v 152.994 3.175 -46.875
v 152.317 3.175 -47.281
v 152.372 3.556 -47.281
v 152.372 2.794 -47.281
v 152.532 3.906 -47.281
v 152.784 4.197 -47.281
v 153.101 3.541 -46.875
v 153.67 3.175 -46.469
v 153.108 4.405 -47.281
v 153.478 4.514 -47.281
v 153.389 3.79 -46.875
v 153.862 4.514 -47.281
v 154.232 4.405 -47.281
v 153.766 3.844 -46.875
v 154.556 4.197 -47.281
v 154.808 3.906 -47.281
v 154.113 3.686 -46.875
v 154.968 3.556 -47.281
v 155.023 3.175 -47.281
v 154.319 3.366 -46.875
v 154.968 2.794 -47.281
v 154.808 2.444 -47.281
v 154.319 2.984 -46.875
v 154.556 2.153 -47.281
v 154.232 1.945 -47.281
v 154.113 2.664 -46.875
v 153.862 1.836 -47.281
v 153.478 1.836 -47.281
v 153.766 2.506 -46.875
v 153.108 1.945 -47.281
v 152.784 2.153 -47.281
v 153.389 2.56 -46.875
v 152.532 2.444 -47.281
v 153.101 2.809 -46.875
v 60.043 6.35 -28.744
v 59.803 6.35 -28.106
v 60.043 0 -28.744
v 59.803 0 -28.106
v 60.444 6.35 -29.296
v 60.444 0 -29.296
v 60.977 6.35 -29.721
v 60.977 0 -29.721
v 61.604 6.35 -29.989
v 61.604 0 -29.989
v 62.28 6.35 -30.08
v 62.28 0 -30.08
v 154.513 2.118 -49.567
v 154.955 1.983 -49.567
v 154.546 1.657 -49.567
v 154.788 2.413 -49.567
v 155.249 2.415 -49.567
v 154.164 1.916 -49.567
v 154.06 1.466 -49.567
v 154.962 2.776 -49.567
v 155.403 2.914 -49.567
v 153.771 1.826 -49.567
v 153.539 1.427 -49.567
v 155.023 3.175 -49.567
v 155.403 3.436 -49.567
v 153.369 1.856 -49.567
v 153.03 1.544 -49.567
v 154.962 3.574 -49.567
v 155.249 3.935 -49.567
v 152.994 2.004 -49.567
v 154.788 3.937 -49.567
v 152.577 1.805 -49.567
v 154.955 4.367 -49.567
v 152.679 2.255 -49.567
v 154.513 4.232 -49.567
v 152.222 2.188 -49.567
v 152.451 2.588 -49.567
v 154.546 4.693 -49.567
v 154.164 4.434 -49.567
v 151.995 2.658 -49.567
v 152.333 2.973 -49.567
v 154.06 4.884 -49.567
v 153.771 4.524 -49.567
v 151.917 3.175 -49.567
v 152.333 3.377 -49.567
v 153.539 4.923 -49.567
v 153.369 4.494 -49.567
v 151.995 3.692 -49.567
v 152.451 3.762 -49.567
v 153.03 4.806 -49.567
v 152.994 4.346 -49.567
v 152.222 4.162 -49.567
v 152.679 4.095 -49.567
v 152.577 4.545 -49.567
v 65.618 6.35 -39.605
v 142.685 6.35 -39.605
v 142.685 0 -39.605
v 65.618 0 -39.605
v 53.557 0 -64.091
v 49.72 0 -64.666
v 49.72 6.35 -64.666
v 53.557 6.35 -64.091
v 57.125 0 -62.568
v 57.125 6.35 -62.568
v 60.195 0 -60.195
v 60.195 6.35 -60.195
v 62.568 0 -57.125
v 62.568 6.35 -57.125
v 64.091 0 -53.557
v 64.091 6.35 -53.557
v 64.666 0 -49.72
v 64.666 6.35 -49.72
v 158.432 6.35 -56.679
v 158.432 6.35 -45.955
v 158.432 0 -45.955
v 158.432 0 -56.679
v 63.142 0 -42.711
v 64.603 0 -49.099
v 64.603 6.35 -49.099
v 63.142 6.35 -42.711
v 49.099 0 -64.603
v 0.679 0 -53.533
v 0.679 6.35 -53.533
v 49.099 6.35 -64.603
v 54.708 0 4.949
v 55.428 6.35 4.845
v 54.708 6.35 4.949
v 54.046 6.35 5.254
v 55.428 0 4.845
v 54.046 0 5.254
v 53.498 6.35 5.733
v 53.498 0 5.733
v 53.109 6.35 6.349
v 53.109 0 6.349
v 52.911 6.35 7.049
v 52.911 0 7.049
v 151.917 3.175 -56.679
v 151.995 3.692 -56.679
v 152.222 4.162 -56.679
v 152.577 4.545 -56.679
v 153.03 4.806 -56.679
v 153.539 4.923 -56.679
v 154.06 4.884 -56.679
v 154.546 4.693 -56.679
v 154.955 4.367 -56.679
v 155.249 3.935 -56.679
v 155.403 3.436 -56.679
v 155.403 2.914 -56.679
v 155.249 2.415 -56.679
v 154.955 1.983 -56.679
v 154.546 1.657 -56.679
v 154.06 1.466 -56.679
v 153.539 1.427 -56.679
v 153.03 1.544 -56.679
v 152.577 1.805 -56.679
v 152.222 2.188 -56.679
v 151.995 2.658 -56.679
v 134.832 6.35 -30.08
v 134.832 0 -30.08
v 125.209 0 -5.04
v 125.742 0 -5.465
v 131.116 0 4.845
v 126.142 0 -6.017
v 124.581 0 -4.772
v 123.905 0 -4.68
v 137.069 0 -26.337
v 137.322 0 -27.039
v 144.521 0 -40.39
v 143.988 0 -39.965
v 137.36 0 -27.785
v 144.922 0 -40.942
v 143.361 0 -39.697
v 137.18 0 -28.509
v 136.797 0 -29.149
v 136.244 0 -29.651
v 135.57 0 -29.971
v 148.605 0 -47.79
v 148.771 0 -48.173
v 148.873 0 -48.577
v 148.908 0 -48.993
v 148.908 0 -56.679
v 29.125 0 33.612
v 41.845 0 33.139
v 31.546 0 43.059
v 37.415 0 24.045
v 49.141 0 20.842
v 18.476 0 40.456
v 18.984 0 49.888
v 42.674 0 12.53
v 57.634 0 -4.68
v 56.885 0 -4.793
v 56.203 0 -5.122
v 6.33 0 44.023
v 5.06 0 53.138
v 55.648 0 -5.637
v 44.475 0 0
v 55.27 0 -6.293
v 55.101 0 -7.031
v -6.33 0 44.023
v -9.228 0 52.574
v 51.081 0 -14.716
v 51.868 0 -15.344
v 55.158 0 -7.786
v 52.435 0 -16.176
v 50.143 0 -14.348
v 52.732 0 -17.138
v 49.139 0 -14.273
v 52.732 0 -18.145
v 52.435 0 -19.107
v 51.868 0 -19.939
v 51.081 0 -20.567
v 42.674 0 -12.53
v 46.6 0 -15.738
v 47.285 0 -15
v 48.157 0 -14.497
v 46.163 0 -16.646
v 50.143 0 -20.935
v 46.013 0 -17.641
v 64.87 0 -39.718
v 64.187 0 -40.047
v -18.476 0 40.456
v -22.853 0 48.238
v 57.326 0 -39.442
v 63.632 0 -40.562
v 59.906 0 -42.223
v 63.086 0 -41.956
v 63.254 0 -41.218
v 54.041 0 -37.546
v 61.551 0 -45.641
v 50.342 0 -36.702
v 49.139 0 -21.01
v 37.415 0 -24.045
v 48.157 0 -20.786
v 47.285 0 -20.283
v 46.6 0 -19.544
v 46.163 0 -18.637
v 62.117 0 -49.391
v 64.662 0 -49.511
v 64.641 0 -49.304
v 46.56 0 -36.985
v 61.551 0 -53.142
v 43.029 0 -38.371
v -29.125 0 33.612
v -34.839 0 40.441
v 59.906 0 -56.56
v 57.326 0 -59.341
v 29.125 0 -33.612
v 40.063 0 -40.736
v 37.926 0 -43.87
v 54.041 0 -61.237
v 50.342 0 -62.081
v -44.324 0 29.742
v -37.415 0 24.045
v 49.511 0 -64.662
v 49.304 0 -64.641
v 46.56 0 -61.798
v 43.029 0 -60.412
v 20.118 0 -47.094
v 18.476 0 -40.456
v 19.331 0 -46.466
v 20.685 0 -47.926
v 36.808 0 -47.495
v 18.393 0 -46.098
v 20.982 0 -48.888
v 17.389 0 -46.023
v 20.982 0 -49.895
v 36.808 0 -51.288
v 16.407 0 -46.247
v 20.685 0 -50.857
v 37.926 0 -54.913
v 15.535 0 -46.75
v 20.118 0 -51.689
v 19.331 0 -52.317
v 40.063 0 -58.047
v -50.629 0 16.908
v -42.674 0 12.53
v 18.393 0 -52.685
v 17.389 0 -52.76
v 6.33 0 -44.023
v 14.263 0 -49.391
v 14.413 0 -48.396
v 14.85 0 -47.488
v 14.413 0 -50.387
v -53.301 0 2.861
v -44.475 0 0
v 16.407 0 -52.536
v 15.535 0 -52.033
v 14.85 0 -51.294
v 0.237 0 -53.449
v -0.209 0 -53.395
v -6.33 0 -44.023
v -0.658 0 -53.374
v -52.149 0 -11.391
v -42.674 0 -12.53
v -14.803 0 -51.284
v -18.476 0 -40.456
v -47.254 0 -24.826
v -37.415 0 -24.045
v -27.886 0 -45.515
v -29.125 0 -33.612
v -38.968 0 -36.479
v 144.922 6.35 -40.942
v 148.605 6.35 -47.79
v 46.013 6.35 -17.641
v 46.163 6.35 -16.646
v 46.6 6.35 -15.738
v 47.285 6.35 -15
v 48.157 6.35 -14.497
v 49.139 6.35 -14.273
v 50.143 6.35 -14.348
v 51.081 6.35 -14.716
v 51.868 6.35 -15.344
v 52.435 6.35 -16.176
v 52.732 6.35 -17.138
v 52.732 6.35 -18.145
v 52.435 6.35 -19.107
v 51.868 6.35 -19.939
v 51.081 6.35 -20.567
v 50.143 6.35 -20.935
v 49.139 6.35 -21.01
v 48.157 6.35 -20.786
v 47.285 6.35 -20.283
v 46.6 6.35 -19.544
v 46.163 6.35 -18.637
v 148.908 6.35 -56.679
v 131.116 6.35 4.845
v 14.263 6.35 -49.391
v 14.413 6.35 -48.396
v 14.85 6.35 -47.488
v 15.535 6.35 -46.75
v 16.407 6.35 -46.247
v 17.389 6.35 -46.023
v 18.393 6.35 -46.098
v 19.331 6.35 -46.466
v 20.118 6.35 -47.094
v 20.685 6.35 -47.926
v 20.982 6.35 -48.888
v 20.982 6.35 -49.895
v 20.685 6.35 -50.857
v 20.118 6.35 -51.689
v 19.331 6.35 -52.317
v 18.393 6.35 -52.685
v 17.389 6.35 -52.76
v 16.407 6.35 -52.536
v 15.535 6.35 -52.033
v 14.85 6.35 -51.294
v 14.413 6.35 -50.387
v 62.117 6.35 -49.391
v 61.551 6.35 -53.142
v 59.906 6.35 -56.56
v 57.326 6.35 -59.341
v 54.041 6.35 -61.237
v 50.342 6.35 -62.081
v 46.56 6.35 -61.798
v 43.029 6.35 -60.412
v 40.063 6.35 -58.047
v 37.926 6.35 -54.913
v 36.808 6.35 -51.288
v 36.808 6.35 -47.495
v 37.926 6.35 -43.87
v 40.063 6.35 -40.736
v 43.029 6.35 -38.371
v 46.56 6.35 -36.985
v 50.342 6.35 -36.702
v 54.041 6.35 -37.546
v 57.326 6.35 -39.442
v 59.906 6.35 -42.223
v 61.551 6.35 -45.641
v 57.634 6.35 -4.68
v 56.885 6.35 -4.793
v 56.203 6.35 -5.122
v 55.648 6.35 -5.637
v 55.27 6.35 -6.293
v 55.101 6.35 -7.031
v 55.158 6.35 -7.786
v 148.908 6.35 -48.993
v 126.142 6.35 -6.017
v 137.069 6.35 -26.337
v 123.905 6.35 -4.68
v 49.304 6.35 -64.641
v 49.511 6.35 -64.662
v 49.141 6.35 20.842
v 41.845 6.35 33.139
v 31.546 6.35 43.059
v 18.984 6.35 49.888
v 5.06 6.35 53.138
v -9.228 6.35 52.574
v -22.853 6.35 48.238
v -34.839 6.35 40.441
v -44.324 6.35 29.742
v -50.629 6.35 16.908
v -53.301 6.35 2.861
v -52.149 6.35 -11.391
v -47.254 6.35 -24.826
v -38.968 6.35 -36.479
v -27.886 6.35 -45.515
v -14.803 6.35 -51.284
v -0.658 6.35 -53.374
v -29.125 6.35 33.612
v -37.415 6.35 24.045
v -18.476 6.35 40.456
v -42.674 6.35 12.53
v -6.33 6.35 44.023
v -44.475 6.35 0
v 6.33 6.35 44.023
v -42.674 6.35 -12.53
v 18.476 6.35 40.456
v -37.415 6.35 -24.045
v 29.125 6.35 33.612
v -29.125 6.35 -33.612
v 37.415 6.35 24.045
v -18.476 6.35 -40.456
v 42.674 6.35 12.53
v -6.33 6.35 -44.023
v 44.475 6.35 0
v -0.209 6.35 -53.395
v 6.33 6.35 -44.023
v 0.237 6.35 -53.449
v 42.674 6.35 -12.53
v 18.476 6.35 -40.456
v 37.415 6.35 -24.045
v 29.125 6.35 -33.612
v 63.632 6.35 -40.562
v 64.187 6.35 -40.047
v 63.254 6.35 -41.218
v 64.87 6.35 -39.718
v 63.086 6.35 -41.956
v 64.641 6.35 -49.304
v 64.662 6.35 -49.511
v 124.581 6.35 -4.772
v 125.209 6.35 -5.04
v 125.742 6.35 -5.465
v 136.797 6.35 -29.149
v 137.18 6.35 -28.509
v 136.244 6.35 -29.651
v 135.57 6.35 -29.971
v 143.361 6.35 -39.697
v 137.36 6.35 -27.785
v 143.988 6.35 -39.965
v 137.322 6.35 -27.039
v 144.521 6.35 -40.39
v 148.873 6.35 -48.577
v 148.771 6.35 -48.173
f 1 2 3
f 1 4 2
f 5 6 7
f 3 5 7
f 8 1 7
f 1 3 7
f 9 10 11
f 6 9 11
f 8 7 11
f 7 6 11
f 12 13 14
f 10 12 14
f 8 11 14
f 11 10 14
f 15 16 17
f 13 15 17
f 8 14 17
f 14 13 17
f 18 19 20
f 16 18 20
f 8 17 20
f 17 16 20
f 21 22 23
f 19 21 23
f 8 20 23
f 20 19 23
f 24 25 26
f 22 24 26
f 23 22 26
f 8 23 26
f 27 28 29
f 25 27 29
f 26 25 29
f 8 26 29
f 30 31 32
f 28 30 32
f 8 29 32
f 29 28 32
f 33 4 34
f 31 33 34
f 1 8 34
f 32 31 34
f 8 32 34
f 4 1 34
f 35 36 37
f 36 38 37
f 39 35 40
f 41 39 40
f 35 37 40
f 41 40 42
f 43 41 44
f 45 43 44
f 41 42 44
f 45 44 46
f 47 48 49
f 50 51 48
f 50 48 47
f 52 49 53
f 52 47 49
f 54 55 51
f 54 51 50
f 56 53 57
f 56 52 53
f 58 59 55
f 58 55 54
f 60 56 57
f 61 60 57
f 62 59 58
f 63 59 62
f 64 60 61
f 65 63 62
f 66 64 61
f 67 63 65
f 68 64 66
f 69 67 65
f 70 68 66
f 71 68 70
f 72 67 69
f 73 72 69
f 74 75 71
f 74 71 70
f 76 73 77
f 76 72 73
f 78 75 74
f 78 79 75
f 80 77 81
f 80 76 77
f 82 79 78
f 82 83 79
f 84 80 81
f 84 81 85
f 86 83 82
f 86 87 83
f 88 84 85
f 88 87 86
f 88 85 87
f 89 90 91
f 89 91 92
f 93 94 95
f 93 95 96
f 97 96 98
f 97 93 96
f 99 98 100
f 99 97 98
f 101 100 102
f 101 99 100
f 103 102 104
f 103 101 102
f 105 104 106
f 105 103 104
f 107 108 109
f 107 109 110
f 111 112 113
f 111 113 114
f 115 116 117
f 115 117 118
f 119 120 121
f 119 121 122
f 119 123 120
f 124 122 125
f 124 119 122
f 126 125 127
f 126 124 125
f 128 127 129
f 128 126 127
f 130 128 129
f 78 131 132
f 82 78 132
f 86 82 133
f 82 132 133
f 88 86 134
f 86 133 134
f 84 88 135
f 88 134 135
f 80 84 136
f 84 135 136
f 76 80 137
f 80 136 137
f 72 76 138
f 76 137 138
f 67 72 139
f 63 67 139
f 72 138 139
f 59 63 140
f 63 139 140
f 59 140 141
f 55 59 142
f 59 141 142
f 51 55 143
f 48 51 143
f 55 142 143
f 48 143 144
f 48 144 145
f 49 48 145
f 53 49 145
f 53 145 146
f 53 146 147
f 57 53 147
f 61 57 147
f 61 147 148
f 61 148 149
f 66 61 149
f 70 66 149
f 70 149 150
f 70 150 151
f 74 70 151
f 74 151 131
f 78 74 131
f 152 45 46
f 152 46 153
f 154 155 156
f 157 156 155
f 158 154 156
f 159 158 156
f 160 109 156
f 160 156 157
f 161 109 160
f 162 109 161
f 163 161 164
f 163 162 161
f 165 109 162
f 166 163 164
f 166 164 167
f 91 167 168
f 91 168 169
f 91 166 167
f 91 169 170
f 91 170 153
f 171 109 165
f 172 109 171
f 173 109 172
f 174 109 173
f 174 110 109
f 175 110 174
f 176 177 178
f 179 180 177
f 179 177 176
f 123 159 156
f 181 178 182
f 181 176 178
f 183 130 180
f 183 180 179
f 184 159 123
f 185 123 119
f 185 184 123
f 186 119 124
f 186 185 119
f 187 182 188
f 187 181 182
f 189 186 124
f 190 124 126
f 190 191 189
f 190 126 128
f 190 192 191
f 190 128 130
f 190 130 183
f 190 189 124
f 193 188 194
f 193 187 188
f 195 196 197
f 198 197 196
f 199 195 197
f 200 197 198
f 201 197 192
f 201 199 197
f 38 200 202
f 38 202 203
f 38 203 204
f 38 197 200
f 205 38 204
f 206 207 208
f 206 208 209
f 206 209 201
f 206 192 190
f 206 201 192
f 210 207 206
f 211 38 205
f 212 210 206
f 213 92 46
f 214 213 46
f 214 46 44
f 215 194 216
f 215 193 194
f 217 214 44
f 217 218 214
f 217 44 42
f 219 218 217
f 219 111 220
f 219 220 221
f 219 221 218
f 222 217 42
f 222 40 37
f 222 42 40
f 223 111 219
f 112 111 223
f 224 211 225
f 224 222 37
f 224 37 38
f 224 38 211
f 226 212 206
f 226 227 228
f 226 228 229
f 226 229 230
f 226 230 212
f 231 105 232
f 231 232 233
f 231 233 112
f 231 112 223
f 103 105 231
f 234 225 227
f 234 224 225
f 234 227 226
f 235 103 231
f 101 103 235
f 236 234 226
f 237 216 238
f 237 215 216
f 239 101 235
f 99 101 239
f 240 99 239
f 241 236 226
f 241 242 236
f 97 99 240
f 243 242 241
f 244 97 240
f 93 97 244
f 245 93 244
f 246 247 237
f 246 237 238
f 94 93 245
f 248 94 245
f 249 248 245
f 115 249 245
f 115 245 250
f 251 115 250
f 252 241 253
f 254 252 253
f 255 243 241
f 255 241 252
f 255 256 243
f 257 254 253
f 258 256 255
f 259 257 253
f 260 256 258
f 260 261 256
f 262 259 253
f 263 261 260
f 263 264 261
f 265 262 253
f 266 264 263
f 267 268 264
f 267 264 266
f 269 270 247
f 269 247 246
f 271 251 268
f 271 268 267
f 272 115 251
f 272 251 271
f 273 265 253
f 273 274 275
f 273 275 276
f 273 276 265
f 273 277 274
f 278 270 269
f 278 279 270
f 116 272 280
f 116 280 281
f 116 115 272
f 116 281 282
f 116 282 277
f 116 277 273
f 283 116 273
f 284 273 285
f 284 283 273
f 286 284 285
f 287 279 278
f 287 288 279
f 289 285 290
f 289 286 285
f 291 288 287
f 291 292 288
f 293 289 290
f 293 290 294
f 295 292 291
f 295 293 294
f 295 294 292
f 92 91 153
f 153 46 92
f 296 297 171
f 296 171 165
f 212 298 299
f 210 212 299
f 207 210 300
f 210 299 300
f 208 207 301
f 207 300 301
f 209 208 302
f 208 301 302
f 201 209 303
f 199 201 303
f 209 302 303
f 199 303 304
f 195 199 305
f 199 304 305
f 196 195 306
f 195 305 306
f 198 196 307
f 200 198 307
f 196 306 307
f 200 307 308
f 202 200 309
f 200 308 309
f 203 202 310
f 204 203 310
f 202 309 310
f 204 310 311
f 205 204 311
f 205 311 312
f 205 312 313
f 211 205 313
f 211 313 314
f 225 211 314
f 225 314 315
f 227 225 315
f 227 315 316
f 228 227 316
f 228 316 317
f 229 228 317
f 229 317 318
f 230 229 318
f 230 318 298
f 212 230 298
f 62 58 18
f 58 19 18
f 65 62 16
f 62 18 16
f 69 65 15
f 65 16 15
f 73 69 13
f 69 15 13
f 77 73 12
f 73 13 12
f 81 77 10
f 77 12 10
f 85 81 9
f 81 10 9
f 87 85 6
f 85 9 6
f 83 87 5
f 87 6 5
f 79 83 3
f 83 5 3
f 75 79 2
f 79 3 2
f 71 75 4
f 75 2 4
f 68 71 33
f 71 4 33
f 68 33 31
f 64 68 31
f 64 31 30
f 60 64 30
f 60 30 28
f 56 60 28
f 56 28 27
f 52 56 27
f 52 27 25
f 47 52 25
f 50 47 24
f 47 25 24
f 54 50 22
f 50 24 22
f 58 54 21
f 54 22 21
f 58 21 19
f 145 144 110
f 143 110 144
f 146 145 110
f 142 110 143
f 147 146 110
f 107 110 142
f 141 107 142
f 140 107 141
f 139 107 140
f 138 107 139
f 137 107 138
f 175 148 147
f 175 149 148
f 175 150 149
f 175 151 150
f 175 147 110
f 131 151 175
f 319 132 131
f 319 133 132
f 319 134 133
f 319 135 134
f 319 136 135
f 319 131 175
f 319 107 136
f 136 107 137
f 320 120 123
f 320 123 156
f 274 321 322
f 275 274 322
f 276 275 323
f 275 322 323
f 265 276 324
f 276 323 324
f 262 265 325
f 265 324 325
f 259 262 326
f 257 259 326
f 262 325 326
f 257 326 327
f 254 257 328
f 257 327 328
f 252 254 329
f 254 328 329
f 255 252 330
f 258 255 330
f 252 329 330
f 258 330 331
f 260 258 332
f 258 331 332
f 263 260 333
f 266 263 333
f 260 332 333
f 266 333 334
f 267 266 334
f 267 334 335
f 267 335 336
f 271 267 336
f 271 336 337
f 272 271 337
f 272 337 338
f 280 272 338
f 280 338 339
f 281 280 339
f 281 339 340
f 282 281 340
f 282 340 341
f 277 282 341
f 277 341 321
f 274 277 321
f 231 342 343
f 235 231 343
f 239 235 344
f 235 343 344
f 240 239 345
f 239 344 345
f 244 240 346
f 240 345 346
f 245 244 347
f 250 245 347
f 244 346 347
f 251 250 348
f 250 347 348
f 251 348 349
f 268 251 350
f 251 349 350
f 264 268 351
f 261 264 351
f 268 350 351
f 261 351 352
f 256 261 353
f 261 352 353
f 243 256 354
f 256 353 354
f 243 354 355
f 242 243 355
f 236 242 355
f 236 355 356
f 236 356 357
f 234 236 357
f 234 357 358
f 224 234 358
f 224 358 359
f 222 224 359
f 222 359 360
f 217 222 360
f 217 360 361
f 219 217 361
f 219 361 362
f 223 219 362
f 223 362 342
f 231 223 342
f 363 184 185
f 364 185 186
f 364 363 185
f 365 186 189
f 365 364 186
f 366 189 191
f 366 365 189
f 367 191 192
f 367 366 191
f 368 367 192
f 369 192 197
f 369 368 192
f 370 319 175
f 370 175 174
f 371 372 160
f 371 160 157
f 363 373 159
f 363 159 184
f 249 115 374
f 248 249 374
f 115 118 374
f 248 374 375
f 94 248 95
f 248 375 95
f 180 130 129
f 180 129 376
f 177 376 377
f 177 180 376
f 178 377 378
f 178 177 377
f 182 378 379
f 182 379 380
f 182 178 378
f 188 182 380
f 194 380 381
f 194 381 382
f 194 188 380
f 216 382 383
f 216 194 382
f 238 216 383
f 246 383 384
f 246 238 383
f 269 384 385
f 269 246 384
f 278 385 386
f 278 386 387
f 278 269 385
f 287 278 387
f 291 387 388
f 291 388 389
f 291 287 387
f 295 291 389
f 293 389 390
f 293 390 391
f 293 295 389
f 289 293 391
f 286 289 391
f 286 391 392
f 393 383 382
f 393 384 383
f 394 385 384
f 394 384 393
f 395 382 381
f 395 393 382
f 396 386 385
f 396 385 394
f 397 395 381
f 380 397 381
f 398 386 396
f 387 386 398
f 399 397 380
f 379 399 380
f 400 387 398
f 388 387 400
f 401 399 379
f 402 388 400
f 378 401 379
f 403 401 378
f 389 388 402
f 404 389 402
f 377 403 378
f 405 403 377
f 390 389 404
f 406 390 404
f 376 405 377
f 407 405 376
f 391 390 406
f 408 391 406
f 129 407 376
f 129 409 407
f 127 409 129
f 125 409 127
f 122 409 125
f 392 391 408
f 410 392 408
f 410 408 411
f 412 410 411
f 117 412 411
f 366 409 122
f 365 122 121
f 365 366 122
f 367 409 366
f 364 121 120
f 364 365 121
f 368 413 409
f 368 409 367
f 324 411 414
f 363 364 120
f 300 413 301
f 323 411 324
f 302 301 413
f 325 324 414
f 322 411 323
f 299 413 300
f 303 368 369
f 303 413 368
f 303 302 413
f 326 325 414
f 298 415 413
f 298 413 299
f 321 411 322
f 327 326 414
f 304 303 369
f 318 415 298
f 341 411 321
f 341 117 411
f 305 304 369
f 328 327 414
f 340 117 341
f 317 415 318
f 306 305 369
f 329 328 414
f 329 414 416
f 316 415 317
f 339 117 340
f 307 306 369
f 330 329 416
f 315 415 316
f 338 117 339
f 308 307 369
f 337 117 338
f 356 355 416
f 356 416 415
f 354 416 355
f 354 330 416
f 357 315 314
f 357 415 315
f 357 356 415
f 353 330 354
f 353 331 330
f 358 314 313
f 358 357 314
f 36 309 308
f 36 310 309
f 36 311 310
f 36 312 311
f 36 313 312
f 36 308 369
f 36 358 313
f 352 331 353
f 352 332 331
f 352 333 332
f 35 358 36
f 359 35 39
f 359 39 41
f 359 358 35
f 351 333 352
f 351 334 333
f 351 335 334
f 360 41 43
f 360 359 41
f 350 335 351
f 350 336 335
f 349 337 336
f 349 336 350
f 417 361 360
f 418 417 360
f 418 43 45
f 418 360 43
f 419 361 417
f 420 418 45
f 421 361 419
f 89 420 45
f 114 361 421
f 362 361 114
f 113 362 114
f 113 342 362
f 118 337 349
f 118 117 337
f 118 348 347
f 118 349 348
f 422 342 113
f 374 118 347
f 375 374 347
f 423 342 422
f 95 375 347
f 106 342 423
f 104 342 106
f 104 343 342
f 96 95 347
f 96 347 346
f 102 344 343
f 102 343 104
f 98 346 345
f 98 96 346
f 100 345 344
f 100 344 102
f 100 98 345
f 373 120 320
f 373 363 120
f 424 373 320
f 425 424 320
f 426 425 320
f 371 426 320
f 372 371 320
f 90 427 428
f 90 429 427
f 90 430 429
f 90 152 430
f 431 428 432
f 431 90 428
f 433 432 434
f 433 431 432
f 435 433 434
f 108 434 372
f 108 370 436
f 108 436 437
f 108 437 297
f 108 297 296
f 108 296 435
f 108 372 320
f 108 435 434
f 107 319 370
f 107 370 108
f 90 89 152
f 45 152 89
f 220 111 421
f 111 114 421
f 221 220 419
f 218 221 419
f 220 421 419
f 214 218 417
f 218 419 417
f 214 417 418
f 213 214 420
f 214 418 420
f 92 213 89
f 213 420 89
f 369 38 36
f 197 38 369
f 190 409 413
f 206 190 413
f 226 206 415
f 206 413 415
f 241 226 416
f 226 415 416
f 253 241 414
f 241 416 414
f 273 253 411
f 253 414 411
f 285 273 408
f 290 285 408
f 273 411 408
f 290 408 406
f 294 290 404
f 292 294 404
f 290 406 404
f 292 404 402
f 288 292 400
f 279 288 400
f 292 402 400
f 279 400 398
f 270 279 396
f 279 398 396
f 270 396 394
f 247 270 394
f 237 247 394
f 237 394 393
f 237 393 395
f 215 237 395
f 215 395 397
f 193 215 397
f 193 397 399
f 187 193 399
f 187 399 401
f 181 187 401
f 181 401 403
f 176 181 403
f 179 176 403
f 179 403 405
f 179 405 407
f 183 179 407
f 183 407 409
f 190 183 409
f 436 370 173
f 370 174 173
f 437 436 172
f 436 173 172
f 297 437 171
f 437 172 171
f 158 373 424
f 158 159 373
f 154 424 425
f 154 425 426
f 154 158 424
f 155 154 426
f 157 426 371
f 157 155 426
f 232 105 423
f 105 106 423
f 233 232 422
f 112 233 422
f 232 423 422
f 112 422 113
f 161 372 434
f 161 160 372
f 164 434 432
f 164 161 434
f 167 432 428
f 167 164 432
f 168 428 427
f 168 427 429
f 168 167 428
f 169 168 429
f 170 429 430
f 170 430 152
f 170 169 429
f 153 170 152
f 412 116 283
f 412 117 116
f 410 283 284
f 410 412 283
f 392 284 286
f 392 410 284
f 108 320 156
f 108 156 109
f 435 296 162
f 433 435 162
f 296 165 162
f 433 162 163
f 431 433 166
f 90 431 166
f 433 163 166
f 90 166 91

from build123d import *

# Parameters (mm, degrees)
BOSS_EXTRUDE1_DEPTH             = 6.35
FILLET2_R                       = 6.35
BOSS_EXTRUDE2_DEPTH             = 6.35
SKETCH3_R                       = 44.4754
SKETCH3_R_2                     = 12.7254
CUT_EXTRUDE1_DEPTH              = 7.35
FILLET3_R                       = 2.54
F_6_32_TAPPED_HOLE1_D           = 2.7051
F_6_32_TAPPED_HOLE1_DEPTH       = 9.398
F_6_32_TAPPED_HOLE1_CBORE_D     = 3.5052
F_6_32_TAPPED_HOLE1_CBORE_DEPTH = 7.112
F_6_32_TAPPED_HOLE1_TIP         = 0.81269403
F_1_4_CLEARANCE_HOLE1_D         = 6.7564
F_1_4_CLEARANCE_HOLE1_DEPTH     = 25.4
F_1_4_CLEARANCE_HOLE1_TIP       = 2.029827343


with BuildPart() as part:
    # Sketch1 → Boss-Extrude1 (new body)
    with BuildSketch(Plane(origin=(0, 0, 0), x_dir=(1, 0, 0), z_dir=(0, 1, 0))):
        with BuildLine():
            Line((0, 53.3781), (49.391408666, 64.669508666))
            ThreePointArc((49.391408666, 64.669508666), (60.19465678, 60.19465678), (64.669508666, 49.391408666))
            Line((64.669508666, 49.391408666), (53.3781, 0))
            ThreePointArc((53.3781, 0), (-37.744016477, -37.744016477), (0, 53.3781))
        make_face()
    extrude(amount=BOSS_EXTRUDE1_DEPTH)

    # Fillet2
    fillet2_edges = [part.edges().sort_by_distance(p)[0] for p in [
        (0, 3.175, -53.3781),
        (53.3781, 3.175, 0),
    ]]
    fillet(fillet2_edges, radius=FILLET2_R)

    # Sketch4 → Boss-Extrude2 (add)
    with BuildSketch(Plane(origin=(0, 6.35, 0), x_dir=(1, 0, 0), z_dir=(0, 1, 0))):
        Polygon((52.07, -4.84480564), (131.116478857, -4.84480564), (158.4325, 45.95519436), (158.4325, 56.6794421), (148.9075, 56.6794421), (148.9075, 48.353689839), (144.203285679, 39.60519436), (52.07, 39.60519436), (52.07, 30.08019436), (139.081531715, 30.08019436), (125.423521143, 4.68019436), (52.07, 4.68019436), align=None)
    extrude(amount=-BOSS_EXTRUDE2_DEPTH)

    # Sketch3 → Cut-Extrude1 (cut, through all)
    with BuildSketch(Plane(origin=(0, 6.35, 0), x_dir=(1, 0, 0), z_dir=(0, 1, 0))):
        Circle(SKETCH3_R)
        with Locations((49.391408666, 49.391408666)):
            Circle(SKETCH3_R_2)
    extrude(amount=-CUT_EXTRUDE1_DEPTH, mode=Mode.SUBTRACT)

    # Fillet3
    fillet3_edges = [part.edges().sort_by_distance(p)[0] for p in [
        (139.081531715, 3.175, -30.08019436),
        (54.448042903, 3.175, -4.68019436),
        (125.423521143, 3.175, -4.68019436),
        (60.25475682, 3.175, -30.08019436),
        (62.432274539, 3.175, -39.60519436),
        (144.203285679, 3.175, -39.60519436),
        (148.9075, 3.175, -48.353689839),
        (53.157778527, 3.175, 4.84480564),
        (49.391408666, 3.175, -64.669508666),
        (64.669508666, 3.175, -49.391408666),
    ]]
    fillet(fillet3_edges, radius=FILLET3_R)

    # #6-32 Tapped Hole1
    with Locations(Plane(origin=(0, 0, -56.6794421), x_dir=(-1, 0, 0), z_dir=(0, 0, -1))):
        with Locations((-153.67, 3.175)):
            CounterBoreHole(F_6_32_TAPPED_HOLE1_D / 2, F_6_32_TAPPED_HOLE1_CBORE_D / 2, F_6_32_TAPPED_HOLE1_CBORE_DEPTH, depth=F_6_32_TAPPED_HOLE1_DEPTH)
            with Locations((0, 0, -(F_6_32_TAPPED_HOLE1_DEPTH + F_6_32_TAPPED_HOLE1_TIP / 2))):  # 118° drill point
                Cone(0, F_6_32_TAPPED_HOLE1_D / 2, F_6_32_TAPPED_HOLE1_TIP, mode=Mode.SUBTRACT)

    # 1/4 Clearance Hole1
    with Locations(Plane.XZ):
        with Locations((49.391408666, -17.641408666), (17.641408666, -49.391408666)):
            Hole(F_1_4_CLEARANCE_HOLE1_D / 2, depth=F_1_4_CLEARANCE_HOLE1_DEPTH)
            with Locations((0, 0, -(F_1_4_CLEARANCE_HOLE1_DEPTH + F_1_4_CLEARANCE_HOLE1_TIP / 2))):  # 118° drill point
                Cone(0, F_1_4_CLEARANCE_HOLE1_D / 2, F_1_4_CLEARANCE_HOLE1_TIP, mode=Mode.SUBTRACT)


solid = part.part
